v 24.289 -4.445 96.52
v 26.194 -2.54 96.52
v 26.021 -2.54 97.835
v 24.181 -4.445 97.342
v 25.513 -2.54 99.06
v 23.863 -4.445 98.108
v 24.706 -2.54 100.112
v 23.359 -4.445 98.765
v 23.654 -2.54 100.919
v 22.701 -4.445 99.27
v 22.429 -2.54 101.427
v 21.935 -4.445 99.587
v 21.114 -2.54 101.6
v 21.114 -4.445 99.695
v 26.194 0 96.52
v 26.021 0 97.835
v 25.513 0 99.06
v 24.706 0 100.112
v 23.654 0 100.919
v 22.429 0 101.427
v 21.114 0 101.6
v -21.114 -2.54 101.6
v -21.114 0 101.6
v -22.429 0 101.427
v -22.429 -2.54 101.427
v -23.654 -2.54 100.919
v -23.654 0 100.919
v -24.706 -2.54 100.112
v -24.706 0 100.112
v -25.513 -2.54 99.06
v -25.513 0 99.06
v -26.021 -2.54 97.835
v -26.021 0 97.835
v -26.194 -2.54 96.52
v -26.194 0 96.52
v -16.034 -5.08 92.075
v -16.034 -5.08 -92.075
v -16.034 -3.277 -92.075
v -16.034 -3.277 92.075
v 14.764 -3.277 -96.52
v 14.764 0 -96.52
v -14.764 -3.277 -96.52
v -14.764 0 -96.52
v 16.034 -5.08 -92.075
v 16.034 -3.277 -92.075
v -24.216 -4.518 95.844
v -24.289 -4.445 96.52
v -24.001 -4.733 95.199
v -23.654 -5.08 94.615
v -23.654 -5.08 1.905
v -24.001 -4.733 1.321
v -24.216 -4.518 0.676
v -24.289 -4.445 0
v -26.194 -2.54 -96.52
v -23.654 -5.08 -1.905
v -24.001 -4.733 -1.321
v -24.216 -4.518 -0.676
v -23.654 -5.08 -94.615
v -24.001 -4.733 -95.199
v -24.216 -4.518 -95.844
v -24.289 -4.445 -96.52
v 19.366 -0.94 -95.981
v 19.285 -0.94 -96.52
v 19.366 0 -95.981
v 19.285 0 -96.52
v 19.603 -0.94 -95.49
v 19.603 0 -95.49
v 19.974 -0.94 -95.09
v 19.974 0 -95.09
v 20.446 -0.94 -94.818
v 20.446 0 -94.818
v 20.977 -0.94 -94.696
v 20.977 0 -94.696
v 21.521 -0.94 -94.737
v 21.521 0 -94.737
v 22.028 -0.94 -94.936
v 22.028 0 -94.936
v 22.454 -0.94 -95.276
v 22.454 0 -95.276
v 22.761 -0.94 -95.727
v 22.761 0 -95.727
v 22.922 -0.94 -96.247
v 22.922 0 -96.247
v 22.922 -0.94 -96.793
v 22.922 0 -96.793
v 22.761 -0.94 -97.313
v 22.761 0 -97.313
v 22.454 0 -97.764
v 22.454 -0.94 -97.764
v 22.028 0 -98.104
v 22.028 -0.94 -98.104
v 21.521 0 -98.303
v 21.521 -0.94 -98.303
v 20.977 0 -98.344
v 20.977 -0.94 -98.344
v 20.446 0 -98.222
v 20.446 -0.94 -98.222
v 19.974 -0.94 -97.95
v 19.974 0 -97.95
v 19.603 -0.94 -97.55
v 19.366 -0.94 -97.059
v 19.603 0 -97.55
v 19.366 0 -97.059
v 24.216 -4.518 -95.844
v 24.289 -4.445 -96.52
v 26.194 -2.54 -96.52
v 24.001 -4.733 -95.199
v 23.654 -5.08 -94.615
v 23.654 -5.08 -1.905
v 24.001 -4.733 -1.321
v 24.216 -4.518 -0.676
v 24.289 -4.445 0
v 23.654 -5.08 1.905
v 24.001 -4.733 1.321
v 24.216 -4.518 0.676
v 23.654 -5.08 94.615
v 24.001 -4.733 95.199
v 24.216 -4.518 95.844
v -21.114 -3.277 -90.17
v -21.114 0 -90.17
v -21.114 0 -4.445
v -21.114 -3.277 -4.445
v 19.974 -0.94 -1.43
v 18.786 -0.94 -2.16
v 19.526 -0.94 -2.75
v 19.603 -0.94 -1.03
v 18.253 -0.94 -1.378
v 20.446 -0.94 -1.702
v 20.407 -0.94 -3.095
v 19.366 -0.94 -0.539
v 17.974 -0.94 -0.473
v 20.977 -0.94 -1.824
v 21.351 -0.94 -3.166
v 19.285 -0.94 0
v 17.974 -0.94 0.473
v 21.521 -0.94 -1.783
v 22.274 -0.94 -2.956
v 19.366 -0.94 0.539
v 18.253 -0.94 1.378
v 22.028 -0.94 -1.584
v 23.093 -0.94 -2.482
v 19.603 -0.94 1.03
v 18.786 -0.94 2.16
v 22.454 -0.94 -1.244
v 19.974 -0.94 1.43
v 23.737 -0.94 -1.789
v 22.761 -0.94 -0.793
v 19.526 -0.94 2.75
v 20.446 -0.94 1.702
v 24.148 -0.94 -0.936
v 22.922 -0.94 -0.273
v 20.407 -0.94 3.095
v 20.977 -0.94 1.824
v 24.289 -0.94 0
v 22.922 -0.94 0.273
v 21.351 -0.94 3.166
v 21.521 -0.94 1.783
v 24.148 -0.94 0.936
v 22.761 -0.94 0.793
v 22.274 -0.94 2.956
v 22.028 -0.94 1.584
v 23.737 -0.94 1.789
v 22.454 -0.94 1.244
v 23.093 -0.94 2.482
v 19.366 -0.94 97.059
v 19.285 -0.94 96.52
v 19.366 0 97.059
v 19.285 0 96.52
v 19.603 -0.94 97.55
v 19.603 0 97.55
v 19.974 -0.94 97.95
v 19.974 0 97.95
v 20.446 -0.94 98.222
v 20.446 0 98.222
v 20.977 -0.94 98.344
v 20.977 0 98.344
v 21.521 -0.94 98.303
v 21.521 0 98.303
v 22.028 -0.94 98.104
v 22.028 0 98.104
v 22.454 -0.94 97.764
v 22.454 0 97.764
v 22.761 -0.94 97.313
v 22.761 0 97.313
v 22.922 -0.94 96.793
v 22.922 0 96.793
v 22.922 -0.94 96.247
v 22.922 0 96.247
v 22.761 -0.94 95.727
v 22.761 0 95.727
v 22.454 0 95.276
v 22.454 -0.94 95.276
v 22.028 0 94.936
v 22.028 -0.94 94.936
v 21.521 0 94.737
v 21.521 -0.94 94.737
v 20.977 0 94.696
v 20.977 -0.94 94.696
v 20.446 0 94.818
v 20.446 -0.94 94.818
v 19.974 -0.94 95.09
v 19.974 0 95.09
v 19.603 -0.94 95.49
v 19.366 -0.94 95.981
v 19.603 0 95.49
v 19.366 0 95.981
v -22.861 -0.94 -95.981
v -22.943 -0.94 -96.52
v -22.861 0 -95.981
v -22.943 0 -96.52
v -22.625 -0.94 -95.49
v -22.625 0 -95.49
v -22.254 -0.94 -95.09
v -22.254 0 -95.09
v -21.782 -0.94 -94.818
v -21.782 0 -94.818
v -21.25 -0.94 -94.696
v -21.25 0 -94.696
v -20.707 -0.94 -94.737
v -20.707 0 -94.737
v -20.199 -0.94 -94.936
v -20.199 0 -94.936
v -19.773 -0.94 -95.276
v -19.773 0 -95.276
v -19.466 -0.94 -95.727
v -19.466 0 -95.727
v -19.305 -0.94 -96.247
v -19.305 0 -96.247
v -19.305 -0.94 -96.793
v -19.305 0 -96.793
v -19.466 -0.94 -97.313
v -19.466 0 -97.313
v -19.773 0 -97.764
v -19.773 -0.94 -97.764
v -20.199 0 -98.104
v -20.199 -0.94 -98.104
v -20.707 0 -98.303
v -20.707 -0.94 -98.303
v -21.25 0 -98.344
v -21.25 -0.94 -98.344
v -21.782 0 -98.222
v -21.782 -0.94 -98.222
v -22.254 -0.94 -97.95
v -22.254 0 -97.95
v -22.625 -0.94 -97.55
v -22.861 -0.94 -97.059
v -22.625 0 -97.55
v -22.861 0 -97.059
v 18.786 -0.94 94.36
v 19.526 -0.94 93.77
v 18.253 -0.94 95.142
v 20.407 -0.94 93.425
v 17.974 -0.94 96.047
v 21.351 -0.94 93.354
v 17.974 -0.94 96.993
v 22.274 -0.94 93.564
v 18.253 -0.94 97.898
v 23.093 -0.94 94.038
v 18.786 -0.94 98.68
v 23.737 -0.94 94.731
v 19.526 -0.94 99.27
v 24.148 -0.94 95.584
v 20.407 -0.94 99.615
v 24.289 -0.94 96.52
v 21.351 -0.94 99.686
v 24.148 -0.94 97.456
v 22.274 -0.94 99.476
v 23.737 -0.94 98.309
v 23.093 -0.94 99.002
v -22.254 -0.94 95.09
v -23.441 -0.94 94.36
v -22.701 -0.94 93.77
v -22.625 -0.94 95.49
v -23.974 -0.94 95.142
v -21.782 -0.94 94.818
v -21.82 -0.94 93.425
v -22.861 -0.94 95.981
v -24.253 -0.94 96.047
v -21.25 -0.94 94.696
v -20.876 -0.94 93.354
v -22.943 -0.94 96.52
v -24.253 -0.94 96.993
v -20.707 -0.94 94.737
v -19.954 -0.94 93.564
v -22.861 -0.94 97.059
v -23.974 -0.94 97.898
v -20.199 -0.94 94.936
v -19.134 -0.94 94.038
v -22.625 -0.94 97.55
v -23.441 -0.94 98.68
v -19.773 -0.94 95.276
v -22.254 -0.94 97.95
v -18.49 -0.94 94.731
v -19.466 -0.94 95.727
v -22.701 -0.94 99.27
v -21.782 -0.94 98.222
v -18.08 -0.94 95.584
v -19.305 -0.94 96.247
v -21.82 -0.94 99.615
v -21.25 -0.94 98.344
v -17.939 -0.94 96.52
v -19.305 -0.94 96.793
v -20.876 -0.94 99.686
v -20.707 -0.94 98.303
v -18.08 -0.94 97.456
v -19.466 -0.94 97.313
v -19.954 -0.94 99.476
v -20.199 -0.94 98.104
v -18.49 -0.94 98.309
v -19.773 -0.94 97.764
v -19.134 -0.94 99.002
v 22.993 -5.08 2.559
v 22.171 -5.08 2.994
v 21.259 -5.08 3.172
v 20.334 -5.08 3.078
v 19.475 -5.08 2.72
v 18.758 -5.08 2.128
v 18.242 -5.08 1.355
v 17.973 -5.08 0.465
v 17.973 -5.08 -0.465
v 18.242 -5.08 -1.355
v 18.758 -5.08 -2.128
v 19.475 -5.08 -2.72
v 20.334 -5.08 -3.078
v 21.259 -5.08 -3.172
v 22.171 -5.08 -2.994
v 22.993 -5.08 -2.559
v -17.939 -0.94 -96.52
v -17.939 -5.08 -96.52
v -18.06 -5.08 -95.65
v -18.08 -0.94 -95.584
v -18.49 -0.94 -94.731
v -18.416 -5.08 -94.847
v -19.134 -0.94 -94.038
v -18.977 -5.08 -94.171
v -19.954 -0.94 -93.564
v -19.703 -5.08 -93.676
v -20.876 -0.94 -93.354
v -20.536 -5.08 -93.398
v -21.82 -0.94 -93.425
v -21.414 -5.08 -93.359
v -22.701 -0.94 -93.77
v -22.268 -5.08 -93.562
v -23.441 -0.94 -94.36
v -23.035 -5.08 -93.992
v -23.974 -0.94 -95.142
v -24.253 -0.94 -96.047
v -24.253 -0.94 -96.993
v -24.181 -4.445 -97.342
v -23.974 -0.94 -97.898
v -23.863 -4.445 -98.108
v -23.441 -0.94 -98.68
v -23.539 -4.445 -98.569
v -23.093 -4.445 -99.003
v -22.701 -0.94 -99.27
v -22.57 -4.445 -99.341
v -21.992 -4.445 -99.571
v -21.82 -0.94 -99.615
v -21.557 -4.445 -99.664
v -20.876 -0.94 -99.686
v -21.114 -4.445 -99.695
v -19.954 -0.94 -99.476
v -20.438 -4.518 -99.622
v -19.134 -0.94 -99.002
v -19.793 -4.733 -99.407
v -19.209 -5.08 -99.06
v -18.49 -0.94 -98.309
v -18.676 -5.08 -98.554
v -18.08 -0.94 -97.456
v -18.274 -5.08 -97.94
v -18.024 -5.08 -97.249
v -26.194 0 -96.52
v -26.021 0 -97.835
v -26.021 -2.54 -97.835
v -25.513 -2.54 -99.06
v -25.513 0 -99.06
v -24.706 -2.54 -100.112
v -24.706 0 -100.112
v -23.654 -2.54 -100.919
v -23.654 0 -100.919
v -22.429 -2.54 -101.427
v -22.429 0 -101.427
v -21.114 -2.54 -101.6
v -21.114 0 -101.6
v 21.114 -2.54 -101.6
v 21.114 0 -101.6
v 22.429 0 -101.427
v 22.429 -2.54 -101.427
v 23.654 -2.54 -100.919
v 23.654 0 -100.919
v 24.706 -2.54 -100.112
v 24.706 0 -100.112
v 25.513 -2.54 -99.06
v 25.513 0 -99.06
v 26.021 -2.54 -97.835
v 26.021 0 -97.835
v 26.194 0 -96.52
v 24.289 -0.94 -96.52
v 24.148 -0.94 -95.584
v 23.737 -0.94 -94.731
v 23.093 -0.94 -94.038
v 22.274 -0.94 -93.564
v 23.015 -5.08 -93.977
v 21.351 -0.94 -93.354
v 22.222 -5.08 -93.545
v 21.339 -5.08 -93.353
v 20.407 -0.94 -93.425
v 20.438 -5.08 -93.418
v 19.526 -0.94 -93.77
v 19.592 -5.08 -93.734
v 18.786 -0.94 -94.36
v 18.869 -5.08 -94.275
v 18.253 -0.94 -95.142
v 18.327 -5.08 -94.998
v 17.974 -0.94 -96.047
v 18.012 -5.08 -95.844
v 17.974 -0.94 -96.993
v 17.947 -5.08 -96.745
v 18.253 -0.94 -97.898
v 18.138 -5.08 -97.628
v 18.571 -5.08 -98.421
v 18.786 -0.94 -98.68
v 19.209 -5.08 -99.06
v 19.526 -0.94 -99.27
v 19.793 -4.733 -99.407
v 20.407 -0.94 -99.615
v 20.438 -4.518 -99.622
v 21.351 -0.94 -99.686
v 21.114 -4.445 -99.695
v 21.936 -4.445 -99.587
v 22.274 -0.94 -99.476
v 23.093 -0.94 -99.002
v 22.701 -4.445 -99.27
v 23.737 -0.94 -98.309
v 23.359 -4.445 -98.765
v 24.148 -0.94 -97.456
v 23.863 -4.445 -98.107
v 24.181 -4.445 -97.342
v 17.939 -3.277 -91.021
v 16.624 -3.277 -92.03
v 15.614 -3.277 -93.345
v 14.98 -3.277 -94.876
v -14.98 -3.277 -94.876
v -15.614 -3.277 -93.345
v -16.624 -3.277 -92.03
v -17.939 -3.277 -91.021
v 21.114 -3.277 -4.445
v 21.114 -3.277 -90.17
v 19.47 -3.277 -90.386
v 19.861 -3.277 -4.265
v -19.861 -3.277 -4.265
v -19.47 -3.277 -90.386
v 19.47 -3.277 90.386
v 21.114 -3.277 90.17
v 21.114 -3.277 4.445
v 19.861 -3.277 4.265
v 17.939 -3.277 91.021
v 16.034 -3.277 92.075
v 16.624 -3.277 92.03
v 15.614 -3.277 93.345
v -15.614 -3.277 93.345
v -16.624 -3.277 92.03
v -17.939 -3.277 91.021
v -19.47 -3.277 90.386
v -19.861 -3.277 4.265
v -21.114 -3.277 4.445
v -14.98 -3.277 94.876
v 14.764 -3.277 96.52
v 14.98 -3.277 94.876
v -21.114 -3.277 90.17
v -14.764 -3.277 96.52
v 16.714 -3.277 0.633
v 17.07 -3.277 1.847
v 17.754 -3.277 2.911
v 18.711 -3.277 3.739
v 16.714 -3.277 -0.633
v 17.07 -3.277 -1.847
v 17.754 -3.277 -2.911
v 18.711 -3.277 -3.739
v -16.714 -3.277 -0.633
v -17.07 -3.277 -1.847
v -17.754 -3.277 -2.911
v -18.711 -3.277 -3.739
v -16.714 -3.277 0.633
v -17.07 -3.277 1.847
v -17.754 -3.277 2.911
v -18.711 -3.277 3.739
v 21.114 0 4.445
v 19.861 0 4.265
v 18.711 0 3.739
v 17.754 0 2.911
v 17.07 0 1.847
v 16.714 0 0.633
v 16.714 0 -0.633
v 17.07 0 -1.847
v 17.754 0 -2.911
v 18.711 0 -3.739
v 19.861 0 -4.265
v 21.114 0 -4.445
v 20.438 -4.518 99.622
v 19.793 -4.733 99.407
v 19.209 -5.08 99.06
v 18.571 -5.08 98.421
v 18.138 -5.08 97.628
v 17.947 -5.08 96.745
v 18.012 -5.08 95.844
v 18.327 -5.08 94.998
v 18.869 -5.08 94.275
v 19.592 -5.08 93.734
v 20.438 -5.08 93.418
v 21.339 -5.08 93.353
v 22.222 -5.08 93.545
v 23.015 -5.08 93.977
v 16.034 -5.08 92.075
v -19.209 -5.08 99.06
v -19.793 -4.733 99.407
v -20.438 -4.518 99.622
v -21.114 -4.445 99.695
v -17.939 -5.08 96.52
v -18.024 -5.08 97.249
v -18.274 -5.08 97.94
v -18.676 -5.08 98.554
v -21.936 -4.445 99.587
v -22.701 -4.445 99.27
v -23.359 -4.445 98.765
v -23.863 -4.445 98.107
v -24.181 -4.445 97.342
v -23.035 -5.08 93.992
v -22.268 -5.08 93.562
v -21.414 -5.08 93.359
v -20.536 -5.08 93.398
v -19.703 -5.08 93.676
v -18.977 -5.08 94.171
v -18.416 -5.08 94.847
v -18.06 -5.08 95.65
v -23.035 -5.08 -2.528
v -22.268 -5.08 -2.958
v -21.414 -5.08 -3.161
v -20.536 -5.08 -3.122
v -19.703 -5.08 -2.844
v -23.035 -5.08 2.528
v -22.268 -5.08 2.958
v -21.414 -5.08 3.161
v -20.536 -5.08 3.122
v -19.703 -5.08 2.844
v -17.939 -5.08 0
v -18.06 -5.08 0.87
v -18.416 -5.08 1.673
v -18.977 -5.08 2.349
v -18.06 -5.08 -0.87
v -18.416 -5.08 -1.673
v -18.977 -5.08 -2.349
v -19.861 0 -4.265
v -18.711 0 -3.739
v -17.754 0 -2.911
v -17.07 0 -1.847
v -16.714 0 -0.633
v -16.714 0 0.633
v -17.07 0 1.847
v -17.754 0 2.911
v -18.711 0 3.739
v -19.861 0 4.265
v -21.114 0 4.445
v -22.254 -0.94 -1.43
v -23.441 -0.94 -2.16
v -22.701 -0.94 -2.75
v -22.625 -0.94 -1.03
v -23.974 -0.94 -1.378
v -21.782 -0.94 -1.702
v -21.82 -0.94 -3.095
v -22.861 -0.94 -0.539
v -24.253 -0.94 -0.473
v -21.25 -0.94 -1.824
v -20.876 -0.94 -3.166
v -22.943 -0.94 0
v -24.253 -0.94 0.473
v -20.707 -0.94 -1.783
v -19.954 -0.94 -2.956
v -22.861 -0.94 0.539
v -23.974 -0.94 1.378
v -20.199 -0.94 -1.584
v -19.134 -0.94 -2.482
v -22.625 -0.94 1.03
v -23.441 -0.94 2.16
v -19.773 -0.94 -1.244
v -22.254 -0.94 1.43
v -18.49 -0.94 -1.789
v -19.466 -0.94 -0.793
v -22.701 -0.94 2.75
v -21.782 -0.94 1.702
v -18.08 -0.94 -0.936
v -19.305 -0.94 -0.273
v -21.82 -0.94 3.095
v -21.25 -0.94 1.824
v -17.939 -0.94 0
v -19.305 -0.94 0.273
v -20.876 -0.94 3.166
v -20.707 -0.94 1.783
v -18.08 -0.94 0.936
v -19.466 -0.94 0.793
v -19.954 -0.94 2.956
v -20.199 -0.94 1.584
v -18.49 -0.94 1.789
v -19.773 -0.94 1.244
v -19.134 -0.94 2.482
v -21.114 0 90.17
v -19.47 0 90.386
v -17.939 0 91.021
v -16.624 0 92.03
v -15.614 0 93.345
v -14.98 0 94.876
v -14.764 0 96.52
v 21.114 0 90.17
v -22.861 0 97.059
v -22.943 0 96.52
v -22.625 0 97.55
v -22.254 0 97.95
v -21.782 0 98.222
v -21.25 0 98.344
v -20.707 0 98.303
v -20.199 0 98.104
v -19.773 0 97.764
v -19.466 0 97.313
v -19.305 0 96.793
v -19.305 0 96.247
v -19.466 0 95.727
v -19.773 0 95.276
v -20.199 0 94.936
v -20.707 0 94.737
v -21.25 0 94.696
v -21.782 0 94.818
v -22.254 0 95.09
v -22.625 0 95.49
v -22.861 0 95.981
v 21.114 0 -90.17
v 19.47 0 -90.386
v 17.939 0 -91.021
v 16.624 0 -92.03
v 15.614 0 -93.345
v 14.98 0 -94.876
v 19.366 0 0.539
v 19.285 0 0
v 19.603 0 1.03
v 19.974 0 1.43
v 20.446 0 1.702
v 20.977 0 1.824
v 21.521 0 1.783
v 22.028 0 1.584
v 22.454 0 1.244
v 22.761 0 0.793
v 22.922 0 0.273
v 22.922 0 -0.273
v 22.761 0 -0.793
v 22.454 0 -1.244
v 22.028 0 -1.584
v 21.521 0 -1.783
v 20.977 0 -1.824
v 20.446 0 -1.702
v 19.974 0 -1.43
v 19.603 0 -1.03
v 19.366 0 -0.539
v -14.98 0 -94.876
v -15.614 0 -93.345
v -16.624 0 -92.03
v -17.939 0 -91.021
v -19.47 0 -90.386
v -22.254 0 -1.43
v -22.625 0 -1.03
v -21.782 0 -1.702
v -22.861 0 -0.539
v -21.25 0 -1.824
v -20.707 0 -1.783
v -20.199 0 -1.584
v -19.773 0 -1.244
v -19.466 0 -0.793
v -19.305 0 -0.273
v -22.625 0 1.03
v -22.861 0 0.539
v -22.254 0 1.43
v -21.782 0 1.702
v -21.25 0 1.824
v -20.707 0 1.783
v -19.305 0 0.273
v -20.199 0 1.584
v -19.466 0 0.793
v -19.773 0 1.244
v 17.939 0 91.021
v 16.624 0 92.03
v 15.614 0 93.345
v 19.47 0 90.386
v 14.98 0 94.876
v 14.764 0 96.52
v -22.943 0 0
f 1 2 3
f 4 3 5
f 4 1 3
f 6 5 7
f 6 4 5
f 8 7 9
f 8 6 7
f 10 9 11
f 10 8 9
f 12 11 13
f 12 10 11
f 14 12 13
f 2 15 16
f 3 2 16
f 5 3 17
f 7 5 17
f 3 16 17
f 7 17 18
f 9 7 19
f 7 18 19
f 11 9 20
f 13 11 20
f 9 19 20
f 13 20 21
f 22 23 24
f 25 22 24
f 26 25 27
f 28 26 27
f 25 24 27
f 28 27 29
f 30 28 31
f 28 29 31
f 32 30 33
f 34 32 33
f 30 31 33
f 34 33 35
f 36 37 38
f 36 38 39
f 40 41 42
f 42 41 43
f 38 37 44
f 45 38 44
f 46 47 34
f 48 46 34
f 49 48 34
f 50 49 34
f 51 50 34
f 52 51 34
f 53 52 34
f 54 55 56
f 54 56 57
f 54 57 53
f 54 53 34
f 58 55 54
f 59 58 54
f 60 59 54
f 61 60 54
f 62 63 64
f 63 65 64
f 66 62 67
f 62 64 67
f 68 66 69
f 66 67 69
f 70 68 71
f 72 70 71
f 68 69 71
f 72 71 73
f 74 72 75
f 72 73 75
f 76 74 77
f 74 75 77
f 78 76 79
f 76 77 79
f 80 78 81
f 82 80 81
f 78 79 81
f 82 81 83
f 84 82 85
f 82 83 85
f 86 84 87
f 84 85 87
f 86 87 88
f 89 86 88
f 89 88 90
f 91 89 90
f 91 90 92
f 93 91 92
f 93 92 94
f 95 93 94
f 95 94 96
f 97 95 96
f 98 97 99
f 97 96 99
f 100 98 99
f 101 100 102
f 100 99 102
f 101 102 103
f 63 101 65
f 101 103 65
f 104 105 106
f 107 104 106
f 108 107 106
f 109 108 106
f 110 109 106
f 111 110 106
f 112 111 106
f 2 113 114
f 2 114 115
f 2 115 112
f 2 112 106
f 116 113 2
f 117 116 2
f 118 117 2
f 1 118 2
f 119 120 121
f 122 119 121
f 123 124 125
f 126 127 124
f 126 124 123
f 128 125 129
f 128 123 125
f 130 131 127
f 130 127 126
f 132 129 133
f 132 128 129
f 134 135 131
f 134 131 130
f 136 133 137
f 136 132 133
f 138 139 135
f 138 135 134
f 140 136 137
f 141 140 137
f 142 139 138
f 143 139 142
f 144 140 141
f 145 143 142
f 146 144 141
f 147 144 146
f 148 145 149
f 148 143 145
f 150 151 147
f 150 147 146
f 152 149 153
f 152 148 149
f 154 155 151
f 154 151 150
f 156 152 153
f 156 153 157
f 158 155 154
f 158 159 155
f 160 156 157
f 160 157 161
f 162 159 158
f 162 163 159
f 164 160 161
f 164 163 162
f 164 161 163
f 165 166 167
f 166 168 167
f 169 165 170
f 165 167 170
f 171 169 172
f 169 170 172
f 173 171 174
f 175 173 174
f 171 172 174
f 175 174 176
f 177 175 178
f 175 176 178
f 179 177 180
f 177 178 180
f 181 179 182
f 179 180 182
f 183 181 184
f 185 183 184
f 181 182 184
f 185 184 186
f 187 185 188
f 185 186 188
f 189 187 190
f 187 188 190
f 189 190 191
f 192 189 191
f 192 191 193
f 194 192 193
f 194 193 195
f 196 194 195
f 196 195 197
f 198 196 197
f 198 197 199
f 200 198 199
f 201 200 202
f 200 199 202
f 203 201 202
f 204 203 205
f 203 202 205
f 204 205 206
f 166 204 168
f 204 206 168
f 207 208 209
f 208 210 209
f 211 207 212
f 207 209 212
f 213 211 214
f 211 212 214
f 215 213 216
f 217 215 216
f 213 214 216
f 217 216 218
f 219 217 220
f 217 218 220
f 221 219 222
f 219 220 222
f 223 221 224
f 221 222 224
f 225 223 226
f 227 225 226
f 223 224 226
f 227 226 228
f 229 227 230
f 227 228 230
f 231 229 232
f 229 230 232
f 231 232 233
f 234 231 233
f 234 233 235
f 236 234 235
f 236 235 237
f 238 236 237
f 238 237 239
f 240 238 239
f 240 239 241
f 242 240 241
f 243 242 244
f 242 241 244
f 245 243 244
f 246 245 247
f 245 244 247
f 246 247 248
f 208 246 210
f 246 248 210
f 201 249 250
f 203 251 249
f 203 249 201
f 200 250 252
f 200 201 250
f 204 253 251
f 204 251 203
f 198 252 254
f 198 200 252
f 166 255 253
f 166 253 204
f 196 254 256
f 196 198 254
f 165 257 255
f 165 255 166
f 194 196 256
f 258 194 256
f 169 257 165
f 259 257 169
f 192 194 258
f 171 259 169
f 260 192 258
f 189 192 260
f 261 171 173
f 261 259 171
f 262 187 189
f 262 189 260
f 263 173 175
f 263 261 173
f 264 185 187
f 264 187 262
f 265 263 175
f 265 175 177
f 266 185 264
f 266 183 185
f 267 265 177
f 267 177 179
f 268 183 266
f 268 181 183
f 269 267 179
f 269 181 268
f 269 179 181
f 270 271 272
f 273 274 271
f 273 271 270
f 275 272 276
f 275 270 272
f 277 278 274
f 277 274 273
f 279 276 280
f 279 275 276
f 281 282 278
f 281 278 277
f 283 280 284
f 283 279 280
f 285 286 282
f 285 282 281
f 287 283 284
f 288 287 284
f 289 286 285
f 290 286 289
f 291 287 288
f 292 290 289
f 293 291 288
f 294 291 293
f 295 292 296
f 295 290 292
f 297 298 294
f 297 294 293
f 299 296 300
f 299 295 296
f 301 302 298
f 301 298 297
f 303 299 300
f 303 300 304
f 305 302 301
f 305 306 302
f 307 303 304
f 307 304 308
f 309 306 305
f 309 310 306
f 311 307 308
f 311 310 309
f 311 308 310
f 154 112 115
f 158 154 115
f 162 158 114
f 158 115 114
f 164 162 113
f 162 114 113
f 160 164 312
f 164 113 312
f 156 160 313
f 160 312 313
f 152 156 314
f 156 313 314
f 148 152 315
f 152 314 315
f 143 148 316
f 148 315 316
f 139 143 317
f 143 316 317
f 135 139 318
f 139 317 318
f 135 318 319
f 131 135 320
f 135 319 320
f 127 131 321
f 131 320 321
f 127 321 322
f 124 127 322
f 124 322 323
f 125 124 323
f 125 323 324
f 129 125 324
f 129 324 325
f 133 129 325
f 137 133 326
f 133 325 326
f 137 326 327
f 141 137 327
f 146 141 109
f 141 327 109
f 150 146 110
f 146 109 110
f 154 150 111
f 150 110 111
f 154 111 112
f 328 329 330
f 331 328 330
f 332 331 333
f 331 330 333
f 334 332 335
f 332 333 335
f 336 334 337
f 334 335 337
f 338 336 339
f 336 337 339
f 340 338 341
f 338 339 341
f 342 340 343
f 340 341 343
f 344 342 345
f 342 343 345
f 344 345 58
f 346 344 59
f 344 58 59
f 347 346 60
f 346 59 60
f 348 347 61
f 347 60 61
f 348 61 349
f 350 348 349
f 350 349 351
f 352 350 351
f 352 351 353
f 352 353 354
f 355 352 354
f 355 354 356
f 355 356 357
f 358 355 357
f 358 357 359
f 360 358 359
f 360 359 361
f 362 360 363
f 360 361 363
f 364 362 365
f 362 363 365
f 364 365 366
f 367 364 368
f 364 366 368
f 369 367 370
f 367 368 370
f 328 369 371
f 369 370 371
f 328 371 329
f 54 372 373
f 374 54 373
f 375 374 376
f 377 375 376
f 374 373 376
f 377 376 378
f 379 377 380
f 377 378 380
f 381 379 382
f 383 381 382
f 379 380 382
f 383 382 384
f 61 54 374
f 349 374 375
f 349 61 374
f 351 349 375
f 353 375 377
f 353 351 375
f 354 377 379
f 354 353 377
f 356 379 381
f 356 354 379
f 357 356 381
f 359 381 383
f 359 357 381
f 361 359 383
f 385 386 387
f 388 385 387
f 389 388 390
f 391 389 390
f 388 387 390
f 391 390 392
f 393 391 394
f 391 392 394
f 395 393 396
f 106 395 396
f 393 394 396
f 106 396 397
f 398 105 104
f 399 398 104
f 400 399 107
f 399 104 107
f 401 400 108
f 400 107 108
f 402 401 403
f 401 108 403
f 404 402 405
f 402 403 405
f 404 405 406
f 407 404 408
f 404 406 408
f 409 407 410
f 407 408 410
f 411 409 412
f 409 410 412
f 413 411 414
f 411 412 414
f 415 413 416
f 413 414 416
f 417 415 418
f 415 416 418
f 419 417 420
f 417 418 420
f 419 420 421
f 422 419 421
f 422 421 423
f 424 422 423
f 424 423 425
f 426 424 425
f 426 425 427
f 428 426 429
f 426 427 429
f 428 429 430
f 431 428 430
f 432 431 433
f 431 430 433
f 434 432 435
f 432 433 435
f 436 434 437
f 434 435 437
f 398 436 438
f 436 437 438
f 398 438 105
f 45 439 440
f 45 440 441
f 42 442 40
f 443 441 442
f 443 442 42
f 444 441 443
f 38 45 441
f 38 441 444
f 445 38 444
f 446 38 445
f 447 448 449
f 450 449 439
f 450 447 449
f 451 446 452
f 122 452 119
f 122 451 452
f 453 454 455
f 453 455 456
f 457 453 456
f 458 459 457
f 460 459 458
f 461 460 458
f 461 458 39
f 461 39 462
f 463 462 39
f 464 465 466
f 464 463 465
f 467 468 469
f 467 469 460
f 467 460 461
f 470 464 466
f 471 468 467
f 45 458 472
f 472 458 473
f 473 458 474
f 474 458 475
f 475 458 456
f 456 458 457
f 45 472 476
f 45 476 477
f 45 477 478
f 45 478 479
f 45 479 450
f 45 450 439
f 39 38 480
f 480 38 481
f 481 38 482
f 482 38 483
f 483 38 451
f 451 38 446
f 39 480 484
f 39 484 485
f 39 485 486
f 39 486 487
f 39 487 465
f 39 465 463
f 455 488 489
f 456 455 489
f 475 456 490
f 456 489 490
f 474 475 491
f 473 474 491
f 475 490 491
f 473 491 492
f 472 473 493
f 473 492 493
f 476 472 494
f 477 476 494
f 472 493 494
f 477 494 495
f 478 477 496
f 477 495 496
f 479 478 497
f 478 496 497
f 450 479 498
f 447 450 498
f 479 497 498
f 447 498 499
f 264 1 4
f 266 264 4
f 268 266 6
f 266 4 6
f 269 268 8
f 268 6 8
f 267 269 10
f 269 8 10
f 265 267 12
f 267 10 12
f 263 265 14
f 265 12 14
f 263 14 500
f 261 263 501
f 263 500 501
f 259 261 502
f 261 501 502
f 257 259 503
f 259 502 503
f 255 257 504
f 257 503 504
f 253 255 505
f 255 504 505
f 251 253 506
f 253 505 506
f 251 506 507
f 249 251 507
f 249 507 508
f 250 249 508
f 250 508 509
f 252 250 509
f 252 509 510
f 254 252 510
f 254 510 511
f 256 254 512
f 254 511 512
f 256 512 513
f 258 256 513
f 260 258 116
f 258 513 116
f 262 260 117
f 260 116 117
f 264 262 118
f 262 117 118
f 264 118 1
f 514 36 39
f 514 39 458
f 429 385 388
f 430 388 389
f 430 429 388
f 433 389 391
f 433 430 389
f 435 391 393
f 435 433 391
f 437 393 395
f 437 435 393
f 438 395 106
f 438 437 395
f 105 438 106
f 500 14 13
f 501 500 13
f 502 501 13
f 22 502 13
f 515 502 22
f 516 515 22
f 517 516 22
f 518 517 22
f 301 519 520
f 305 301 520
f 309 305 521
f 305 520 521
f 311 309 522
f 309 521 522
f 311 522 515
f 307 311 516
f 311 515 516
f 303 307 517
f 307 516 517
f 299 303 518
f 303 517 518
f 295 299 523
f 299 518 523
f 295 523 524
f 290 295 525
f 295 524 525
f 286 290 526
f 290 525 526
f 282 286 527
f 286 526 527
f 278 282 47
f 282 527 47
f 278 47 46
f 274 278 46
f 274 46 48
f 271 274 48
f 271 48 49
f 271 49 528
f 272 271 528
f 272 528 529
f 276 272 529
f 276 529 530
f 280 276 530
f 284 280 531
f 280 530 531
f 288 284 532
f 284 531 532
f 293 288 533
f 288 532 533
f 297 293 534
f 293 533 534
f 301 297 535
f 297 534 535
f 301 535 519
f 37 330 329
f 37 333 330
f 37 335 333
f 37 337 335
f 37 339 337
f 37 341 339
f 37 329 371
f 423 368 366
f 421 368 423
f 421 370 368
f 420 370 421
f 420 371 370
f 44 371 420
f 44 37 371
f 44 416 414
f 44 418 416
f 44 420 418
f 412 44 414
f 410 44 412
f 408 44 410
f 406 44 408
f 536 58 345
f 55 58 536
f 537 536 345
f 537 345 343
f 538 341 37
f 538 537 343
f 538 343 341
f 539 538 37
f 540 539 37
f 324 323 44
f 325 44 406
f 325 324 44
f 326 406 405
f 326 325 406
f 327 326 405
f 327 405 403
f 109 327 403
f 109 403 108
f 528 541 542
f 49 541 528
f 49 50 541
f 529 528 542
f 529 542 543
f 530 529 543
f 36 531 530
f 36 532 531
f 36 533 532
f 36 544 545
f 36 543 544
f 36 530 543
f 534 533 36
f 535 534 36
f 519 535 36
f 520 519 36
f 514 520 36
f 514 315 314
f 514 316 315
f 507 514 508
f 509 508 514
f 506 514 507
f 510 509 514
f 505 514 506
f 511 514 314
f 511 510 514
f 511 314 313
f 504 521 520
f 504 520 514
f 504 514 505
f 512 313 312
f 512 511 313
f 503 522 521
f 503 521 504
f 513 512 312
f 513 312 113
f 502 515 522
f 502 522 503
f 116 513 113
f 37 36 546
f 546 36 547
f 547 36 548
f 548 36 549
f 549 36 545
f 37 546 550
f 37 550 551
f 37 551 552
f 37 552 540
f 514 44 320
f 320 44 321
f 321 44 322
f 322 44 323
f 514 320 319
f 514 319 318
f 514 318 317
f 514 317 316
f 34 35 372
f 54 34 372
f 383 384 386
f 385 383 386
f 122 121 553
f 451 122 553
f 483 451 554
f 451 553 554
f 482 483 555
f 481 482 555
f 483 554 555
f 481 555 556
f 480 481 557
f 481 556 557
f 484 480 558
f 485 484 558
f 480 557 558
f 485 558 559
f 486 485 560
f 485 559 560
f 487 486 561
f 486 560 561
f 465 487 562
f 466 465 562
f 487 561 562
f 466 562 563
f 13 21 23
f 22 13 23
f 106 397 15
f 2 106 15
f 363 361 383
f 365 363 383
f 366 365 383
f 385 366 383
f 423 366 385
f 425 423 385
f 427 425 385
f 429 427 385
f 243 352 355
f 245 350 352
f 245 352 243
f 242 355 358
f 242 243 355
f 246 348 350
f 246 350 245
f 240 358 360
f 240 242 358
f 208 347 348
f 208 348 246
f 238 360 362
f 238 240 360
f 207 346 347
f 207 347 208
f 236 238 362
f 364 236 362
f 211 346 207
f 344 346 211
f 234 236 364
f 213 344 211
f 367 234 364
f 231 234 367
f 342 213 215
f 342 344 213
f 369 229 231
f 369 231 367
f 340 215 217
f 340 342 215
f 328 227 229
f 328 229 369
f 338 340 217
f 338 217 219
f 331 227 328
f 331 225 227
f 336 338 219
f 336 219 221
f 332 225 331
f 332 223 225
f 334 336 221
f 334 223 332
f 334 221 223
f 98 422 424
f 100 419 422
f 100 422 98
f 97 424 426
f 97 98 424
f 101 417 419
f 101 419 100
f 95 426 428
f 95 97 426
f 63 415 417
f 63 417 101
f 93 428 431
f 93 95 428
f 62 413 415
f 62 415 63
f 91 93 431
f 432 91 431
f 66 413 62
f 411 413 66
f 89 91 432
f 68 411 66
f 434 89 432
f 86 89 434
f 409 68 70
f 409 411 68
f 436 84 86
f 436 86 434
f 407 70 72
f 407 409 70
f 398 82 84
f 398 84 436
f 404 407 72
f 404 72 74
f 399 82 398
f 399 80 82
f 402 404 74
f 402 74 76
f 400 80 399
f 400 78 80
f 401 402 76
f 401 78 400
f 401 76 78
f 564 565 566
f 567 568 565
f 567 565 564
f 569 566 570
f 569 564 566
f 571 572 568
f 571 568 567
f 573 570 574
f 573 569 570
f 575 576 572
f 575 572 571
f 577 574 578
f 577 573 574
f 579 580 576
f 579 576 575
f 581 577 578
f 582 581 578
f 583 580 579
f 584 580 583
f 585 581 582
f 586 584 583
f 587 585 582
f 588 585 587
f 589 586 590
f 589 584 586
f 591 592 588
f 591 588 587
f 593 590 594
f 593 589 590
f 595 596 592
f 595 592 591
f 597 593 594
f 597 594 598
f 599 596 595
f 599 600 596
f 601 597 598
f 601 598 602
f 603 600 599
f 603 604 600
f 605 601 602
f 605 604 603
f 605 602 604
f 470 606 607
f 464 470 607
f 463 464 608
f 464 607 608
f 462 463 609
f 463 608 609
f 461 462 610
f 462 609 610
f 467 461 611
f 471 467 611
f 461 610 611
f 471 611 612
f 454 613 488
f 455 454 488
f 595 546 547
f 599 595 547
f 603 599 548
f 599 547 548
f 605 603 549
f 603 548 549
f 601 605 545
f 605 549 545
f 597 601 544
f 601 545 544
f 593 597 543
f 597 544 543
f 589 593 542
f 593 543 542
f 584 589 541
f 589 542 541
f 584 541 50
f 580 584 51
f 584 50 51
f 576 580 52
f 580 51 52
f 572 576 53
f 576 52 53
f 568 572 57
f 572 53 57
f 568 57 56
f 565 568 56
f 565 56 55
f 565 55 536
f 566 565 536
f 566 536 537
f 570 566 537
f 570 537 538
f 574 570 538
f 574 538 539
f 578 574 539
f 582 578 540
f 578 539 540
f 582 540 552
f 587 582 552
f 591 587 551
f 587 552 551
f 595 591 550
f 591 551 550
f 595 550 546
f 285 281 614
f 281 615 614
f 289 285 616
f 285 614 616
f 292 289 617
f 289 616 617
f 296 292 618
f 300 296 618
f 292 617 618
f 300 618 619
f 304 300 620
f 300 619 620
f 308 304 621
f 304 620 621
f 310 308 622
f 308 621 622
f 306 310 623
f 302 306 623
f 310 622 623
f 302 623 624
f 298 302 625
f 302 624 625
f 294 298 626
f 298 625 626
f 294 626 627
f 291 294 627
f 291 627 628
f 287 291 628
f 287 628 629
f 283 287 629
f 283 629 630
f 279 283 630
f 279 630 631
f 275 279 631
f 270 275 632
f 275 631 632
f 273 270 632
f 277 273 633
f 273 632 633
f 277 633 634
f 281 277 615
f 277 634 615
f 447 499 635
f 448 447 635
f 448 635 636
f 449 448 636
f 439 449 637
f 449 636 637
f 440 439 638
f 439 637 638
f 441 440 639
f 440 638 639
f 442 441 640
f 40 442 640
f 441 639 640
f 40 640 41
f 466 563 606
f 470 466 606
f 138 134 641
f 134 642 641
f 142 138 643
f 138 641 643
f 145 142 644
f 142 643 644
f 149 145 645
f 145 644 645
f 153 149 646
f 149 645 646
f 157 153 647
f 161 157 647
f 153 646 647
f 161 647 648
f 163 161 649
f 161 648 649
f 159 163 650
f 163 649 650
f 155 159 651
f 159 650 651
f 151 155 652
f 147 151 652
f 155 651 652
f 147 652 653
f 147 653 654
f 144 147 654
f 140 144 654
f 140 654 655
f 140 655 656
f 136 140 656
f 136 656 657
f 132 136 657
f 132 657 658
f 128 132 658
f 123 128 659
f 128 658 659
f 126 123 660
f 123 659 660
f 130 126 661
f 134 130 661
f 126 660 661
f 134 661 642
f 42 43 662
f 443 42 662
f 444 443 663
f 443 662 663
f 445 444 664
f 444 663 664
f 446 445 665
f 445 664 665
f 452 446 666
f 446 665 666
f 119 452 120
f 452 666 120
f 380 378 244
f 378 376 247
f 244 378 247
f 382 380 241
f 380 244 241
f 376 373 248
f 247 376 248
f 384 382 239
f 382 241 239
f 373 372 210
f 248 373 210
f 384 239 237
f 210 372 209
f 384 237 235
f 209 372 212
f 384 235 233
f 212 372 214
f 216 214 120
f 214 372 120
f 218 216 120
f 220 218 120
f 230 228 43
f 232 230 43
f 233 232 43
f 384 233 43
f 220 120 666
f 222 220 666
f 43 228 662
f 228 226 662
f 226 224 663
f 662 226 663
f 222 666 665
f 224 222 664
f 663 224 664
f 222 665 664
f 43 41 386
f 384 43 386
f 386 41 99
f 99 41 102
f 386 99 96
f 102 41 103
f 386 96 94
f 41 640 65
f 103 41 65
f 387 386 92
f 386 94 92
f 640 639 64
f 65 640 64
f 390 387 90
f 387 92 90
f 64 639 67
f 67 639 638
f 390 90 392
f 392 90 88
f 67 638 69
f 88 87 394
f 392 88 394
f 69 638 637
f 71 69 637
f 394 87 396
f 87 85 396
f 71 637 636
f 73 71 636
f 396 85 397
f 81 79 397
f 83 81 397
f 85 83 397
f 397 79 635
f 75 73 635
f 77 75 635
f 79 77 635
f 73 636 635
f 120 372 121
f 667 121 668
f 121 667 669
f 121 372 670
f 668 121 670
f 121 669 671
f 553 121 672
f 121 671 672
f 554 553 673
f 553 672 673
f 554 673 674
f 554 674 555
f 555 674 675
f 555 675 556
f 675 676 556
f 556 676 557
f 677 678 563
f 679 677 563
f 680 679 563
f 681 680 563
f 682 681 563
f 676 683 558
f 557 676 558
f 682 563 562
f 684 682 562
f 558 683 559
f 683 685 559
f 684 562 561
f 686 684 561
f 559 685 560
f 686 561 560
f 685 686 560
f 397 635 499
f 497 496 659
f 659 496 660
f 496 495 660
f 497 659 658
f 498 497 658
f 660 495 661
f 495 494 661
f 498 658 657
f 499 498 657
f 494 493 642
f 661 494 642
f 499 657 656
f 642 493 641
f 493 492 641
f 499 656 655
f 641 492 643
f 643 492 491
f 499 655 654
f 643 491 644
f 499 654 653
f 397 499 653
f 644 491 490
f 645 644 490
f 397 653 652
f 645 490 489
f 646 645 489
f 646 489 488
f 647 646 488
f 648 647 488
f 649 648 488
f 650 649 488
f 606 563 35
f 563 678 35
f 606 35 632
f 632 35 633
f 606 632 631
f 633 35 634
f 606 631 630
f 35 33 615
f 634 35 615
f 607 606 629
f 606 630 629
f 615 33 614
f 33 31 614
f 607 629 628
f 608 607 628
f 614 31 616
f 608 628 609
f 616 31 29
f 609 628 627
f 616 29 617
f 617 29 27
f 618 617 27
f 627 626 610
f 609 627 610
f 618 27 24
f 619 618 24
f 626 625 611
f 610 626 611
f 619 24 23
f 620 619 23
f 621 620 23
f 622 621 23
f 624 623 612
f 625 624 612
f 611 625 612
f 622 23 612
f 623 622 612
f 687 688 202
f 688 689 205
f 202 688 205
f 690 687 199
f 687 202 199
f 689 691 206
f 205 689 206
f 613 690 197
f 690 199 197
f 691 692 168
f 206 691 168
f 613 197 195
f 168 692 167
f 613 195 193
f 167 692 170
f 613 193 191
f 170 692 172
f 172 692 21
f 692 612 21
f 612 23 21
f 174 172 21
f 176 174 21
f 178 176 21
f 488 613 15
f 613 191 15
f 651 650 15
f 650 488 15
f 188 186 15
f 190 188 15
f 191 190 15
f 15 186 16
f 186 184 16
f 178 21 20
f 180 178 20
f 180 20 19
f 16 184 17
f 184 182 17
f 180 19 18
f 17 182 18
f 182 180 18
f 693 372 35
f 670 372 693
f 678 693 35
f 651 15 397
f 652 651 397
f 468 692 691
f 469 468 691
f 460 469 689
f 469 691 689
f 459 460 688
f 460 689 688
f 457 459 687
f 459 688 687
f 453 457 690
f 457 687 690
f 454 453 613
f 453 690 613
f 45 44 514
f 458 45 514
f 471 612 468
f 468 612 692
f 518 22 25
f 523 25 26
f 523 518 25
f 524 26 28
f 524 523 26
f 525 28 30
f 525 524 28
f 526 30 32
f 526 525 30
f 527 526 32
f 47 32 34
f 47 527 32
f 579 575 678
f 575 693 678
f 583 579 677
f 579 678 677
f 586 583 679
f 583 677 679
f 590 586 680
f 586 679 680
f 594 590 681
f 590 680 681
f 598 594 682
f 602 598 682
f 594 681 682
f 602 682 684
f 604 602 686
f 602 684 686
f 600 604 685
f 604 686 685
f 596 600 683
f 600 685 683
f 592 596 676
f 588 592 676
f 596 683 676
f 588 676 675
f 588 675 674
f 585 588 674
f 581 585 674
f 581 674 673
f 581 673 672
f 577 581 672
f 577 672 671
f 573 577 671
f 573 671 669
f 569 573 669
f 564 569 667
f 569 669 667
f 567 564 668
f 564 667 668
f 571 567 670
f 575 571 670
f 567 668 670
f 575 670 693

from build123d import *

# Parameters (mm, degrees)
F1_DEPTH       = 5.08
F2_SIZE        = 2.54
F4_D           = 3.6576
F4_START       = 0.635
F4_START_2     = 0.6350001
F4_CBORE_D     = 6.35
F4_CBORE_DEPTH = 3.5052
F5_W           = 32.0675
F5_H           = 184.15
F6_DEPTH       = 5.081
F7_W           = 32.0675
F7_H           = 184.15
F8_DEPTH       = 3.2766


with BuildPart() as f1:
    # F0 (on Front) → F1 (new body)
    with BuildSketch(Plane.XZ):
        with BuildLine():
            ThreePointArc((26.19375, 96.52), (24.7058524484, 100.1121024484), (21.11375, 101.6))
            Line((21.11375, 101.6), (-21.11375, 101.6))
            ThreePointArc((-21.11375, 101.6), (-24.7058524484, 100.1121024484), (-26.19375, 96.52))
            Line((-26.19375, 96.52), (-26.19375, -96.52))
            ThreePointArc((-26.19375, -96.52), (-24.7058524484, -100.1121024484), (-21.11375, -101.6))
            Line((-21.11375, -101.6), (21.11375, -101.6))
            ThreePointArc((21.11375, -101.6), (24.7058524484, -100.1121024484), (26.19375, -96.52))
            Line((26.19375, -96.52), (26.19375, 96.52))
        make_face()
    extrude(amount=F1_DEPTH)

    # F2
    f2_edges = [f1.edges().sort_by_distance(p)[0] for p in [
        (0, -5.08, 101.6),
    ]]
    chamfer(f2_edges, length=F2_SIZE)

    # F4 (through all)
    # its depths count from where the whole tool has entered the part; down to there all is cleared
    with Locations(Plane.XZ.offset(5.08)):
        with Locations((-21.11375, 96.52, -F4_START_2), (21.11375, 96.52, -F4_START_2), (21.11375, 0, -F4_START), (-21.11375, 0, -F4_START), (-21.11375, -96.52, -F4_START_2), (21.11375, -96.52, -F4_START_2)):
            CounterBoreHole(F4_D / 2, F4_CBORE_D / 2, F4_CBORE_DEPTH)

    # F5 (on face) → F6 (cut, through all)
    with BuildSketch(Plane.XZ.offset(5.08)):
        Rectangle(F5_W, F5_H)
    extrude(amount=-F6_DEPTH, mode=Mode.SUBTRACT)

    # F7 (on face) → F8 (cut)
    with BuildSketch(Plane(origin=(0, 0, 0), x_dir=(-1, 0, 0), z_dir=(0, 1, 0))):
        with BuildLine():
            ThreePointArc((21.11375, 90.17), (16.6236219395, 92.0298719395), (14.76375, 96.52))
            Line((14.76375, 96.52), (-14.76375, 96.52))
            ThreePointArc((-14.76375, 96.52), (-16.6236219395, 92.0298719395), (-21.11375, 90.17))
            Line((-21.11375, 90.17), (-21.11375, 4.445))
            ThreePointArc((-21.11375, 4.445), (-16.66875, 0), (-21.11375, -4.445))
            Line((-21.11375, -4.445), (-21.11375, -90.17))
            ThreePointArc((-21.11375, -90.17), (-16.6236219395, -92.0298719395), (-14.76375, -96.52))
            Line((-14.76375, -96.52), (14.76375, -96.52))
            ThreePointArc((14.76375, -96.52), (16.6236219395, -92.0298719395), (21.11375, -90.17))
            Line((21.11375, -90.17), (21.11375, -4.445))
            ThreePointArc((21.11375, -4.445), (16.66875, 0), (21.11375, 4.445))
            Line((21.11375, 4.445), (21.11375, 90.17))
        make_face()
        Rectangle(F7_W, F7_H, mode=Mode.SUBTRACT)
    extrude(amount=-F8_DEPTH, mode=Mode.SUBTRACT)


solid = f1.part
